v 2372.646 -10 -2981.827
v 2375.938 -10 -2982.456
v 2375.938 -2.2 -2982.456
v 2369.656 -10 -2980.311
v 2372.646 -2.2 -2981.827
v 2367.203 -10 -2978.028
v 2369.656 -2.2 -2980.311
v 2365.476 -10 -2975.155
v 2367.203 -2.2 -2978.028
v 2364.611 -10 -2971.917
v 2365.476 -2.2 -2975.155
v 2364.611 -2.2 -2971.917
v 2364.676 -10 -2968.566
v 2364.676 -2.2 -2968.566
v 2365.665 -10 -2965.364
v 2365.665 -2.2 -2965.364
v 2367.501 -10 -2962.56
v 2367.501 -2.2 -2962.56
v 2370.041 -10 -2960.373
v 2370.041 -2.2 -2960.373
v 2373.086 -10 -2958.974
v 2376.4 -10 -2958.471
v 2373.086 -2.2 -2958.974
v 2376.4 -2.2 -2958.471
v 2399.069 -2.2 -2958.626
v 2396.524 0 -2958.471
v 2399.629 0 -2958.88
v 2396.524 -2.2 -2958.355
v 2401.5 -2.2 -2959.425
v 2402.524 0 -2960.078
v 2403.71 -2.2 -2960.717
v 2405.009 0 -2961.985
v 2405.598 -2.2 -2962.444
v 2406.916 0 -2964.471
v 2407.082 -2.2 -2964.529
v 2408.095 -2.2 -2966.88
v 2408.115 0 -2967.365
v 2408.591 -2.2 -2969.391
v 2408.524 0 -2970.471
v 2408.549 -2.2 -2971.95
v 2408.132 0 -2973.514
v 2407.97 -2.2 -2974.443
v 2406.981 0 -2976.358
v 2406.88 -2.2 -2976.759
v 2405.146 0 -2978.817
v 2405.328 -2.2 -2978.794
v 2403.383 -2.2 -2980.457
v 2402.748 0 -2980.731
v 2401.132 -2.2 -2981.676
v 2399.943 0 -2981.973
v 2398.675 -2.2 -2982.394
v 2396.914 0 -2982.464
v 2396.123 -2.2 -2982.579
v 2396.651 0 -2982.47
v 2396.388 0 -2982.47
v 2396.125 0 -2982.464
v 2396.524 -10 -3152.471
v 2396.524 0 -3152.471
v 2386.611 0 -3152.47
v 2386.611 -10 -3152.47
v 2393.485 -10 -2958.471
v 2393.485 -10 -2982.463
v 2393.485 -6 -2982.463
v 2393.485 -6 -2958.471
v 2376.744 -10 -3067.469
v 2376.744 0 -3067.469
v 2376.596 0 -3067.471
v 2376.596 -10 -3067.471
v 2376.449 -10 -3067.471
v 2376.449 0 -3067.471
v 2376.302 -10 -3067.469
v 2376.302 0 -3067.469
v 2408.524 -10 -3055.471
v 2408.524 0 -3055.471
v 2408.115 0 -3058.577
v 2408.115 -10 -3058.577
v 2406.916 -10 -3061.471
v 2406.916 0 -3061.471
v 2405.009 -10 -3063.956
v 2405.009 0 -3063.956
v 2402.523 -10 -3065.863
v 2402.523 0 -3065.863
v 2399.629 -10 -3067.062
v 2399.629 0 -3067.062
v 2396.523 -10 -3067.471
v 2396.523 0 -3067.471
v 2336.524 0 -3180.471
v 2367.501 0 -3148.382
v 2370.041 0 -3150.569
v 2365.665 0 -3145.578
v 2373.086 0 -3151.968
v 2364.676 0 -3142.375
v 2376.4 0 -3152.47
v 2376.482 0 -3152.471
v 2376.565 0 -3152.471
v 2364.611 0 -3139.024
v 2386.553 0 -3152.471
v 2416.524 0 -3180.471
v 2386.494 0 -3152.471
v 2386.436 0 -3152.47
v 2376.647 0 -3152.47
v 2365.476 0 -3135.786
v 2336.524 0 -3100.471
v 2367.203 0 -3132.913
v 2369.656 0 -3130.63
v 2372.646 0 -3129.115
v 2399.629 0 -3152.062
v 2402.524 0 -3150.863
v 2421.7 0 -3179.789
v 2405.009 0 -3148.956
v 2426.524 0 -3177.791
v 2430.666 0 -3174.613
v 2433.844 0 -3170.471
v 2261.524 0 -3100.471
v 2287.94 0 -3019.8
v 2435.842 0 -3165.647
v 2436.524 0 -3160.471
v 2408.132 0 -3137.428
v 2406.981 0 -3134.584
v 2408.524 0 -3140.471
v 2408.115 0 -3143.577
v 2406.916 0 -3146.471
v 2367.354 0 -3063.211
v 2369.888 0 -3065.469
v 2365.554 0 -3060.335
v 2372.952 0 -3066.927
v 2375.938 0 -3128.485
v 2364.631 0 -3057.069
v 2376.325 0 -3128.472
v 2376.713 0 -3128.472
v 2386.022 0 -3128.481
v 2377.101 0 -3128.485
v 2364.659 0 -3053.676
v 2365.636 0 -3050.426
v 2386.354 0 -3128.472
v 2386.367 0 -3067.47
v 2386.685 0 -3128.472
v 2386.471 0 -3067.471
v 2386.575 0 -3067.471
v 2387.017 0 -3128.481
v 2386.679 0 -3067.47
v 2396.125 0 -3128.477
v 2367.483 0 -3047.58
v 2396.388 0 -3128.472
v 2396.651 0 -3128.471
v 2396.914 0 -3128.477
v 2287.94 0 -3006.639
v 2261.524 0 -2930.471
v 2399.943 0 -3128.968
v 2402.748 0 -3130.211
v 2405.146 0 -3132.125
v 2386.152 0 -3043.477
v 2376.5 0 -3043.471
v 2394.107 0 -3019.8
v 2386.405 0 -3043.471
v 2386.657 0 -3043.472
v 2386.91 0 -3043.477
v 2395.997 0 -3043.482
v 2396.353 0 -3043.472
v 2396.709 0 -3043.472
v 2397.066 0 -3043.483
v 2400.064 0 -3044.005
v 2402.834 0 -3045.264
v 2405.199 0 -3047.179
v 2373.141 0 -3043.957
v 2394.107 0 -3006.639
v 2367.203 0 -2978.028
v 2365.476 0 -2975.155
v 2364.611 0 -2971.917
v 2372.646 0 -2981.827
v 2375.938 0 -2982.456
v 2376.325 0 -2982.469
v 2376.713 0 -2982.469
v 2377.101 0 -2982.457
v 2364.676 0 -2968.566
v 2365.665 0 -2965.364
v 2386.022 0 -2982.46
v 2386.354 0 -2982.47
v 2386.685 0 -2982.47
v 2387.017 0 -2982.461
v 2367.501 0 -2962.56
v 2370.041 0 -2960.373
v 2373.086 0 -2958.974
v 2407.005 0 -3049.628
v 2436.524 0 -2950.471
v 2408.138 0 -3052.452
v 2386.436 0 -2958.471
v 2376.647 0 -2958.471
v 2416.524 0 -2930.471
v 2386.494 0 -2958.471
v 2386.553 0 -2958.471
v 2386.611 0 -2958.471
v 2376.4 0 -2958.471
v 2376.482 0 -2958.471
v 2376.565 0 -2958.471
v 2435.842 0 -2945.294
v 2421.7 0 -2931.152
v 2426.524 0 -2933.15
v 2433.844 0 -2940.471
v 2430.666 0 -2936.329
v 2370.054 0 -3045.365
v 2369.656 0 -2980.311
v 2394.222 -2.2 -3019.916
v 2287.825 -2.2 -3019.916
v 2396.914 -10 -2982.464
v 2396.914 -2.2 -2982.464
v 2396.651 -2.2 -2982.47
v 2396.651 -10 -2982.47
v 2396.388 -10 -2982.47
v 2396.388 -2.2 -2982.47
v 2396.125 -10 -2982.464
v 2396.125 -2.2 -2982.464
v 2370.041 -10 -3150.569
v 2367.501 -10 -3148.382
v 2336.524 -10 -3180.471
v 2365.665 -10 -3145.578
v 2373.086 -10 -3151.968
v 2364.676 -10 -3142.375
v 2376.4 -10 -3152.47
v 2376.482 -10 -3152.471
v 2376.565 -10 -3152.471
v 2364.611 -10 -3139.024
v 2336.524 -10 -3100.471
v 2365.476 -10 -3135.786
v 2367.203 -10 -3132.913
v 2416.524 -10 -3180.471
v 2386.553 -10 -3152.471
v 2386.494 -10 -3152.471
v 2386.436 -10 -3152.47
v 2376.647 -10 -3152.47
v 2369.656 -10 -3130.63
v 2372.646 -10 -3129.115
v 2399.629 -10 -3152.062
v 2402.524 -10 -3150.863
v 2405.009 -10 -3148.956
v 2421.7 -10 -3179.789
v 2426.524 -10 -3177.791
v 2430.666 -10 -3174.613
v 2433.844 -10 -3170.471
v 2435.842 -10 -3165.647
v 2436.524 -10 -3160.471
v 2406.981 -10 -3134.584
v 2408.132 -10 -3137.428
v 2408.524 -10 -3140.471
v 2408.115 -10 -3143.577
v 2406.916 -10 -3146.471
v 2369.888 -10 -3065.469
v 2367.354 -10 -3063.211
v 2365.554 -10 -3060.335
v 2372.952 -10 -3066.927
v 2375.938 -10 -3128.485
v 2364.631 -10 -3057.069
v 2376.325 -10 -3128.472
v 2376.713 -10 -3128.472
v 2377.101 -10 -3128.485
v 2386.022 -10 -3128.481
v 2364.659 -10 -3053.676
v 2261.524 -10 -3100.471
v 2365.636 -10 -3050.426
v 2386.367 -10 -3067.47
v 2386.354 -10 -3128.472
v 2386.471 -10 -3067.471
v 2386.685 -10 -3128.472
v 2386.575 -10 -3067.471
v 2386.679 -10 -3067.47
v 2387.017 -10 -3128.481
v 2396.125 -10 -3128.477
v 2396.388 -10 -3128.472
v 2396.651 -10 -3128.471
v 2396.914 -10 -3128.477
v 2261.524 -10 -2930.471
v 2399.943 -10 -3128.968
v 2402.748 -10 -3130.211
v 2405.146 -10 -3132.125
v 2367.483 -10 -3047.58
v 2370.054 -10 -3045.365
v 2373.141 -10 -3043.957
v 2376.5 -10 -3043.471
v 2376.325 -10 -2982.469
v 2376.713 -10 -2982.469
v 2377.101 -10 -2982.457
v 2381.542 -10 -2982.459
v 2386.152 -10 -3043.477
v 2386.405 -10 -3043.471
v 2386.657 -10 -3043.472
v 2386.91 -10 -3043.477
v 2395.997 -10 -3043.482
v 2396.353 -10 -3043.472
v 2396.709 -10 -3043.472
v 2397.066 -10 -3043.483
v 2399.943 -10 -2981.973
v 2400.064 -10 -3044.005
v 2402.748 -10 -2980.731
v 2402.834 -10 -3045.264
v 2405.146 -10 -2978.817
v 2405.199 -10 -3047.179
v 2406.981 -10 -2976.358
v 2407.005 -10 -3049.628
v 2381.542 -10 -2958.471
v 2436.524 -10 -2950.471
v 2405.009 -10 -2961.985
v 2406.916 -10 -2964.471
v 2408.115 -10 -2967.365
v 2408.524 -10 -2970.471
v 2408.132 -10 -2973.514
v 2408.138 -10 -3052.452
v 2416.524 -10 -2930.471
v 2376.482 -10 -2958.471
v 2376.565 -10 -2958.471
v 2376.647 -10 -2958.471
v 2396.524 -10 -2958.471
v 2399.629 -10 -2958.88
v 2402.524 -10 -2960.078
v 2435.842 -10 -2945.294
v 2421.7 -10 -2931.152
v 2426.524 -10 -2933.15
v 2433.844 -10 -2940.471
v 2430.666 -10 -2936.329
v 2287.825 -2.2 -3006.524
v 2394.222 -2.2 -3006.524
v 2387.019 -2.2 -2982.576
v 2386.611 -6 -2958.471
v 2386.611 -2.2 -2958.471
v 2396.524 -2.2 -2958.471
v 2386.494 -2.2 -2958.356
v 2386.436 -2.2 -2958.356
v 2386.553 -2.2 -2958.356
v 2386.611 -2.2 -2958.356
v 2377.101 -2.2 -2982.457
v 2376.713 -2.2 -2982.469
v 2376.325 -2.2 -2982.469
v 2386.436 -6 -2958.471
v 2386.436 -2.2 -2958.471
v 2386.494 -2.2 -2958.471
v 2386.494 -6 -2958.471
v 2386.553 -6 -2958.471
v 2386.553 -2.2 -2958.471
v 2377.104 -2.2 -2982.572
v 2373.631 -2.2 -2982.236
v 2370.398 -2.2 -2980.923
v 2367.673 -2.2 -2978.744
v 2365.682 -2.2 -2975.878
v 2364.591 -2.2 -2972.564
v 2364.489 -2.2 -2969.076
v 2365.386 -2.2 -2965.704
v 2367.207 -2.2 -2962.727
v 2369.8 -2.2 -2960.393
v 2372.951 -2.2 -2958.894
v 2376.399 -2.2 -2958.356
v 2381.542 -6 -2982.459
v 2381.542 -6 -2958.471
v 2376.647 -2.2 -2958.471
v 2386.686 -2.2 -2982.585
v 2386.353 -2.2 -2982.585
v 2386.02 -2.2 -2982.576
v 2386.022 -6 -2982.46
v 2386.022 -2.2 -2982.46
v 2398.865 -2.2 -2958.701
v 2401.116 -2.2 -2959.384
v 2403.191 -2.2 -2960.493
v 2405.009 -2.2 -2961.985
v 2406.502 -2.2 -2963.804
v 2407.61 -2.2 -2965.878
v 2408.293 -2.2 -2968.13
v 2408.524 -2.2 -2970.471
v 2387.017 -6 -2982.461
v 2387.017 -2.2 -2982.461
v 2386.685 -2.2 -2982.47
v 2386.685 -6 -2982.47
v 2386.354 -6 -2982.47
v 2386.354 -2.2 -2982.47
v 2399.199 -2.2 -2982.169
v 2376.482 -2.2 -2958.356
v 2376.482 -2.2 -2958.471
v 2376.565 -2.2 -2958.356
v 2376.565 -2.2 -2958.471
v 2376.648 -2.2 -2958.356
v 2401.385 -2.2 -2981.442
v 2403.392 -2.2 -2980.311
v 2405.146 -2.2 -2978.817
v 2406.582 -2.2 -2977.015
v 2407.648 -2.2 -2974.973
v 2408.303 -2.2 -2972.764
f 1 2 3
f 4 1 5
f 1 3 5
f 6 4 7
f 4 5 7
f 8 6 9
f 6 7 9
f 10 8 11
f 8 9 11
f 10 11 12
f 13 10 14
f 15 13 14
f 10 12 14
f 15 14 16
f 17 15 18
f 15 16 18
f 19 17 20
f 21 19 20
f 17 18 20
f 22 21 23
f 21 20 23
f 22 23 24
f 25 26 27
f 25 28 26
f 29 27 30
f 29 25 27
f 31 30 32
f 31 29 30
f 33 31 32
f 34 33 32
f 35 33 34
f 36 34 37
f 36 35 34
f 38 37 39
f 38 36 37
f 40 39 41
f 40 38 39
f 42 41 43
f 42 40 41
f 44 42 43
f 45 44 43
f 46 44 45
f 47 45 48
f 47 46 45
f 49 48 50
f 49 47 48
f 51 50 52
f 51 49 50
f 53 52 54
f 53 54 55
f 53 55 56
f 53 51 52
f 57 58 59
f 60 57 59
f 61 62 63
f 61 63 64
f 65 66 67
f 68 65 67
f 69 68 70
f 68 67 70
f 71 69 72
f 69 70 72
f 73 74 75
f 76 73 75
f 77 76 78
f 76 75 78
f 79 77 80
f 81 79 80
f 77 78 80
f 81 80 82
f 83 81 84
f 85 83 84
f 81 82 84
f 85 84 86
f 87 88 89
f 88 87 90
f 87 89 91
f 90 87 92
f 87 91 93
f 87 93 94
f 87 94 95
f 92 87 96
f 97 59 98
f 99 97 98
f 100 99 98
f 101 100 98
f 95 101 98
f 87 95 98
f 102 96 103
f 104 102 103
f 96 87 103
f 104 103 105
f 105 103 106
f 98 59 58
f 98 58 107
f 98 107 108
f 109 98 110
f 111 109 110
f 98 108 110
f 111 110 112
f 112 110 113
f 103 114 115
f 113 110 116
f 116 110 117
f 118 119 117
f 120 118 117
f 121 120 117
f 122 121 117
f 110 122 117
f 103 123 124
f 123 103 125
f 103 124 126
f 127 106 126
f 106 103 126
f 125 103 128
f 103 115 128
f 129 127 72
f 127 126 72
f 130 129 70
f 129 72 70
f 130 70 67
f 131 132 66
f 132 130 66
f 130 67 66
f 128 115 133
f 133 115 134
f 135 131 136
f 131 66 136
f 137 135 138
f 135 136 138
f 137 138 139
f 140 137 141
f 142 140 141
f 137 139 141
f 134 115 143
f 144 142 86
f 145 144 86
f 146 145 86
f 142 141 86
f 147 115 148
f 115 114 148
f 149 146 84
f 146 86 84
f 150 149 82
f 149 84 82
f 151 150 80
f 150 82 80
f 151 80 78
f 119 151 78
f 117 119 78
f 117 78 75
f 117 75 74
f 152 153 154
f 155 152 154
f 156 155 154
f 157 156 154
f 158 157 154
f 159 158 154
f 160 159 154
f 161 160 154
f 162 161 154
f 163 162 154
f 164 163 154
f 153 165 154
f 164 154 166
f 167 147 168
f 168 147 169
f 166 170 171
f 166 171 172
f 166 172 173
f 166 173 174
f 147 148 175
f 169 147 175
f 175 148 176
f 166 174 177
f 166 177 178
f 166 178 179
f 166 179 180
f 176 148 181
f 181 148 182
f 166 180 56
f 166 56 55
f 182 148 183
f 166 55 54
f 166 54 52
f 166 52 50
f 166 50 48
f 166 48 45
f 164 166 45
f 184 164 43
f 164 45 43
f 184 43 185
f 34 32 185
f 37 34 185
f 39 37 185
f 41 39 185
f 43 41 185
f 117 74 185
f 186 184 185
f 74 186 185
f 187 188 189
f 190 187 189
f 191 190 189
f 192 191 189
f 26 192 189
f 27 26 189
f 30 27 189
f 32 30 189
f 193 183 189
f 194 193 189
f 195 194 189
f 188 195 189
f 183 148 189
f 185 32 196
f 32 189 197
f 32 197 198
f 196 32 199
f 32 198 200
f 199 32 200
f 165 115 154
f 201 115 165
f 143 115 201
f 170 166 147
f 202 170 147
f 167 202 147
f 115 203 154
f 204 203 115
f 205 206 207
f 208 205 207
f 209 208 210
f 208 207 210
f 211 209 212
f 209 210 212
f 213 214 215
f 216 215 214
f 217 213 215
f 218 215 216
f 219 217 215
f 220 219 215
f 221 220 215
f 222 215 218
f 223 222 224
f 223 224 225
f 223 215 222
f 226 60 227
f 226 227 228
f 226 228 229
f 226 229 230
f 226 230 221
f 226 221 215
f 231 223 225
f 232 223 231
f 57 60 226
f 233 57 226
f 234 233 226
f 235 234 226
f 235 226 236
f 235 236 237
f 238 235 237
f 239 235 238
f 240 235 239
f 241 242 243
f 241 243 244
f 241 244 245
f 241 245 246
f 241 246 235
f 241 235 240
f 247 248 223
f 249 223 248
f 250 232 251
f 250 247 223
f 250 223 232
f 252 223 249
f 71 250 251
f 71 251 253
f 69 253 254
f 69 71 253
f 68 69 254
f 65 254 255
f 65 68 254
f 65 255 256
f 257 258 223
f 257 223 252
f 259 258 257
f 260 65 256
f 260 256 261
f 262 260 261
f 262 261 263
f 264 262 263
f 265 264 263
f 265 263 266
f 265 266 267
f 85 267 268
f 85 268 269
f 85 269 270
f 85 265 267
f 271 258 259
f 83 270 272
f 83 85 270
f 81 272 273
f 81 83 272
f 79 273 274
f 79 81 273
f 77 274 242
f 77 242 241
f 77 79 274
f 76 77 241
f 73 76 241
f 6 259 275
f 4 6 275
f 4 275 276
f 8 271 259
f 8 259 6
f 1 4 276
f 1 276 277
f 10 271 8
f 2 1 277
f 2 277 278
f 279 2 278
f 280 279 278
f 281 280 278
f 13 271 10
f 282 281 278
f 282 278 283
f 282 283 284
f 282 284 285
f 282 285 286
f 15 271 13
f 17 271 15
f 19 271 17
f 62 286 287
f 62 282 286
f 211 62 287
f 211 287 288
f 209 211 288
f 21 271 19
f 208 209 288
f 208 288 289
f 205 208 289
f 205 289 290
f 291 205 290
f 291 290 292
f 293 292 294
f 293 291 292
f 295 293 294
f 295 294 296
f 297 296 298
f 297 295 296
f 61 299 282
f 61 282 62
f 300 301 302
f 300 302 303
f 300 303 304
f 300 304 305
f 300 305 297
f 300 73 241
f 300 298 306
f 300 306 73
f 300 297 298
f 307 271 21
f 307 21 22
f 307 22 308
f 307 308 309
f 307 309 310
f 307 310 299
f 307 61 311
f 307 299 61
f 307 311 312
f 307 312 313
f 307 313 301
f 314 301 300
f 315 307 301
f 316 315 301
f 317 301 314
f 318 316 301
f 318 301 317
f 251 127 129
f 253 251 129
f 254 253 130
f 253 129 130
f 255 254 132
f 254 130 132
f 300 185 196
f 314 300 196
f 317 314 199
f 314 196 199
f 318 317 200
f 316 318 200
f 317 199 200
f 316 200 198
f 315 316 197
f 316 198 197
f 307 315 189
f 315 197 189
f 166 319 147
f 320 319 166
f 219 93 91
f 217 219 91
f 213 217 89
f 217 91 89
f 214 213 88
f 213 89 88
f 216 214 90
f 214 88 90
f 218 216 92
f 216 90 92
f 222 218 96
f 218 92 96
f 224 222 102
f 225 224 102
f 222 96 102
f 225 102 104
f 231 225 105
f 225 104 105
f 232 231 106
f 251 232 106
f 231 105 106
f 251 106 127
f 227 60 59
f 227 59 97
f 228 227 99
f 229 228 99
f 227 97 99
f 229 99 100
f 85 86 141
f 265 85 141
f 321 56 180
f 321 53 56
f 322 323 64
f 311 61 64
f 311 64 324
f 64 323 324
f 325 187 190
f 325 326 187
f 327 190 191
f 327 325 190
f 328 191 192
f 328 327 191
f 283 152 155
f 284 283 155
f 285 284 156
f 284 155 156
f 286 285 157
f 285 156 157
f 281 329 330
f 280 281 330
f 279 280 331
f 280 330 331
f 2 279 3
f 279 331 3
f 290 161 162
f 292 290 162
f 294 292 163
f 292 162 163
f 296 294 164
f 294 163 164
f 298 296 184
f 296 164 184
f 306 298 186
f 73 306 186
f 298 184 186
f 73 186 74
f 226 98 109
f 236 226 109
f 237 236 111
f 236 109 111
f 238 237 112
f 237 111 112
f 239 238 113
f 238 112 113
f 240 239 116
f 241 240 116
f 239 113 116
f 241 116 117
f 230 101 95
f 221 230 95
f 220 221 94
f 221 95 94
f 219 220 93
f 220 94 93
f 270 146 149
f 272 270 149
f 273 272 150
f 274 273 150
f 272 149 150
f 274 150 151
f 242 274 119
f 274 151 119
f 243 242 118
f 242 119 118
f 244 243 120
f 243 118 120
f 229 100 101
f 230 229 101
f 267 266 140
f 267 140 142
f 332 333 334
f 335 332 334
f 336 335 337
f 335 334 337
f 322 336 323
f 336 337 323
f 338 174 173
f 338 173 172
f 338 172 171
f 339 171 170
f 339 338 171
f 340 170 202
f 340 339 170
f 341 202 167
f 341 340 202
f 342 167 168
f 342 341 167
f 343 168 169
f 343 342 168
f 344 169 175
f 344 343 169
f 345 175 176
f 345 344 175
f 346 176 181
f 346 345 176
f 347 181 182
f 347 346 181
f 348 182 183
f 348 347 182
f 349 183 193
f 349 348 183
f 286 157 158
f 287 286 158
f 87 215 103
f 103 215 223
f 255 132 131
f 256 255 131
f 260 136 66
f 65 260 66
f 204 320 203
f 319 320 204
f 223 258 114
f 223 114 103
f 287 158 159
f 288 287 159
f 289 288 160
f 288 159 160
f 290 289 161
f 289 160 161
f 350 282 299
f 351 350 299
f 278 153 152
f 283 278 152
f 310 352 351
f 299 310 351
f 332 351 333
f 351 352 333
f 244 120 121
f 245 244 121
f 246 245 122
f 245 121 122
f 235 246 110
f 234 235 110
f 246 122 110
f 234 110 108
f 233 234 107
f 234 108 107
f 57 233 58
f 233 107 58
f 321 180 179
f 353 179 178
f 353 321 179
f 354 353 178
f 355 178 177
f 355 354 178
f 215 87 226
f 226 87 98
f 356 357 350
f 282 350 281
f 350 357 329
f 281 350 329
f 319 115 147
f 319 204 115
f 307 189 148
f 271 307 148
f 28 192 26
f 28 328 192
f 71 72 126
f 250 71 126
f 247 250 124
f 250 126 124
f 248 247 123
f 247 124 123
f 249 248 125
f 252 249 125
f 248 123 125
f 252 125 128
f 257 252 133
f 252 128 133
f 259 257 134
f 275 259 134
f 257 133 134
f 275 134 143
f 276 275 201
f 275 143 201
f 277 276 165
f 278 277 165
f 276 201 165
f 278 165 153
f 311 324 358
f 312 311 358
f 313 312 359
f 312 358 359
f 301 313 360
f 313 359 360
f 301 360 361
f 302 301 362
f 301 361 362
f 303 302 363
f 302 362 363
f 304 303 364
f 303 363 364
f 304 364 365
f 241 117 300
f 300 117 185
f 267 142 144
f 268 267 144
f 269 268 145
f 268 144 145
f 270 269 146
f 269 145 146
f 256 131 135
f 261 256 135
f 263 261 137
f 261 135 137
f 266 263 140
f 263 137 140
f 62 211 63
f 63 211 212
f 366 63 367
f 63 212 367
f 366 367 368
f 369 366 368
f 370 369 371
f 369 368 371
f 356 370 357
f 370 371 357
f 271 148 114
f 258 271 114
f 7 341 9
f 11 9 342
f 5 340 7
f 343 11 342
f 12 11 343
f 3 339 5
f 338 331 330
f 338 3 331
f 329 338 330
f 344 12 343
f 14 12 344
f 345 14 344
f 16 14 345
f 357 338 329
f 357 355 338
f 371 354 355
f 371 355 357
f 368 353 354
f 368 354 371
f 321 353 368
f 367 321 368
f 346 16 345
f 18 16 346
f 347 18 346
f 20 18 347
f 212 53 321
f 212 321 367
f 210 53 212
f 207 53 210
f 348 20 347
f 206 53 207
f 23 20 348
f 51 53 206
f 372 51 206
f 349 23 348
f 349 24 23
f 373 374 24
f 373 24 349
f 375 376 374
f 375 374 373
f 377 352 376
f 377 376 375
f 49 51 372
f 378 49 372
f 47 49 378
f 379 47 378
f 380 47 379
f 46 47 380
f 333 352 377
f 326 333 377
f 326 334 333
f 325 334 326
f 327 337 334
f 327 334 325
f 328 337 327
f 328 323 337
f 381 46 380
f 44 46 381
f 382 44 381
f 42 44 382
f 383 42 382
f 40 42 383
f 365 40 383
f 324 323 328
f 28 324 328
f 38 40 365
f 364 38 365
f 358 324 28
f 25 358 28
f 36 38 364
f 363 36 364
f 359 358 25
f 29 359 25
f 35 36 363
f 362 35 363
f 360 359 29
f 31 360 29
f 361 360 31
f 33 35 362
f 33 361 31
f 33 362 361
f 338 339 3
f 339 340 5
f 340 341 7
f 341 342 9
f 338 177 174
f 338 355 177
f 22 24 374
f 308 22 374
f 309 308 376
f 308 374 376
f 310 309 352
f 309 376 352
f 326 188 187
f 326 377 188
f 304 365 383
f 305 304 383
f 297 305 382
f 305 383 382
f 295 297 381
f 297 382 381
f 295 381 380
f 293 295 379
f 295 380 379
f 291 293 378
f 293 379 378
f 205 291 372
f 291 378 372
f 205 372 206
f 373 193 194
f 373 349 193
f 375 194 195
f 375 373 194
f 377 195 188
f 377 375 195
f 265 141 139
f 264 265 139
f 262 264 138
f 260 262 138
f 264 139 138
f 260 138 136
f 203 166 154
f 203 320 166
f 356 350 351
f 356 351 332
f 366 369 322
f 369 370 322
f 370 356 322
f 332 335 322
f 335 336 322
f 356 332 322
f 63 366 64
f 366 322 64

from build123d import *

# Parameters (mm, degrees)
F1_DEPTH = 10
F2_W     = 75
F2_H     = 80
F3_DEPTH = 25
F4_W     = 11.9431421733
F4_H     = 45.6254482269
F5_DEPTH = 4
F6_W     = 106.1663627625
F6_H     = 13.160943985
F7_DEPTH = 2.2
F7_TAPER = -3


with BuildPart() as f1:
    # F0 (on Front) → F1 (new body)
    with BuildSketch(Plane.XZ):
        with BuildLine():
            Line((2416.5239715576, -2930.4707694799), (2261.5239715576, -2930.4707694799))
            Line((2261.5239715576, -2930.4707694799), (2261.5239715576, -3180.4707694799))
            Line((2261.5239715576, -3180.4707694799), (2416.5239715576, -3180.4707694799))
            ThreePointArc((2416.5239715576, -3180.4707694799), (2430.6661071813, -3174.6129051036), (2436.5239715576, -3160.4707694799))
            Line((2436.5239715576, -3160.4707694799), (2436.5239715576, -2950.4707694799))
            ThreePointArc((2436.5239715576, -2950.4707694799), (2430.6661071813, -2936.3286338561), (2416.5239715576, -2930.4707694799))
        make_face()
        with BuildLine():
            ThreePointArc((2386.0222752693, -3128.4812615319), (2386.5194053701, -3128.4707703486), (2387.0165433111, -3128.4808831974))
            Line((2387.0165433111, -3128.4808831974), (2396.1245883641, -3128.4774174437))
            ThreePointArc((2396.1245883641, -3128.4774174437), (2396.5194053701, -3128.4707703486), (2396.9142273205, -3128.4771169737))
            ThreePointArc((2396.9142273205, -3128.4771169737), (2405.1461252664, -3132.1246047665), (2408.5239715576, -3140.4707694799))
            ThreePointArc((2408.5239715576, -3140.4707694799), (2405.0091179195, -3148.9561858643), (2396.5235896881, -3152.4707694738))
            Line((2396.5235896881, -3152.4707694738), (2386.6109812809, -3152.4704540302))
            ThreePointArc((2386.6109812809, -3152.4704540302), (2386.5235896881, -3152.4707694738), (2386.4361981155, -3152.4704484682))
            Line((2386.4361981155, -3152.4704484682), (2376.6471792504, -3152.4701369576))
            ThreePointArc((2376.6471792504, -3152.4701369576), (2376.5235896881, -3152.4707694738), (2376.4000001663, -3152.4701290917))
            ThreePointArc((2376.4000001663, -3152.4701290917), (2364.5261998632, -3140.7020147361), (2375.9377122847, -3128.485098866))
            ThreePointArc((2375.9377122847, -3128.485098866), (2376.5194053701, -3128.4707703486), (2377.1011091915, -3128.4846561752))
            Line((2377.1011091915, -3128.4846561752), (2386.0222752693, -3128.4812615319))
        make_face(mode=Mode.SUBTRACT)
        with BuildLine():
            ThreePointArc((2386.1524570887, -3043.476521817), (2386.5310921212, -3043.4707715925), (2386.9097200631, -3043.476971162))
            Line((2386.9097200631, -3043.476971162), (2395.9966068909, -3043.4823631426))
            ThreePointArc((2395.9966068909, -3043.4823631426), (2396.5310921212, -3043.4707715925), (2397.0655632188, -3043.4829974403))
            ThreePointArc((2397.0655632188, -3043.4829974403), (2405.1986214046, -3047.179180366), (2408.5239715576, -3055.4707694799))
            ThreePointArc((2408.5239715576, -3055.4707694799), (2405.0088213897, -3063.9564823743), (2396.5227510032, -3067.4707694178))
            Line((2396.5227510032, -3067.4707694178), (2386.678988276, -3067.4697681805))
            ThreePointArc((2386.678988276, -3067.4697681805), (2386.5227510032, -3067.4707694178), (2386.3665139374, -3067.4697363978))
            Line((2386.3665139374, -3067.4697363978), (2376.7436992517, -3067.4687576337))
            ThreePointArc((2376.7436992517, -3067.4687576337), (2376.5227510032, -3067.4707694178), (2376.3018031686, -3067.4687126872))
            ThreePointArc((2376.3018031686, -3067.4687126872), (2364.5243795036, -3055.3718223336), (2376.4996870262, -3043.4707940523))
            Line((2376.4996870262, -3043.4707940523), (2386.1524570887, -3043.476521817))
        make_face(mode=Mode.SUBTRACT)
        with BuildLine():
            ThreePointArc((2386.4361981157, -2958.4710904915), (2386.5235896881, -2958.4707694859), (2386.6109812808, -2958.4710849295))
            Line((2386.6109812808, -2958.4710849295), (2396.5235896881, -2958.4707694859))
            ThreePointArc((2396.5235896881, -2958.4707694859), (2405.0091179195, -2961.9853530954), (2408.5239715576, -2970.4707694799))
            ThreePointArc((2408.5239715576, -2970.4707694799), (2405.1461252664, -2978.8169341932), (2396.9142273205, -2982.4644219861))
            ThreePointArc((2396.9142273205, -2982.4644219861), (2396.5194053701, -2982.4707686111), (2396.1245883641, -2982.4641215161))
            Line((2396.1245883641, -2982.4641215161), (2387.0165433111, -2982.4606557624))
            ThreePointArc((2387.0165433111, -2982.4606557624), (2386.5194053701, -2982.4707686111), (2386.0222752693, -2982.4602774278))
            Line((2386.0222752693, -2982.4602774278), (2377.1011091916, -2982.4568827845))
            ThreePointArc((2377.1011091916, -2982.4568827845), (2376.5194053701, -2982.4707686111), (2375.9377122847, -2982.4564400938))
            ThreePointArc((2375.9377122847, -2982.4564400938), (2364.5261998632, -2970.2395242236), (2376.4000001663, -2958.471409868))
            ThreePointArc((2376.4000001663, -2958.471409868), (2376.523589688, -2958.4707694859), (2376.6471792503, -2958.4714020022))
            Line((2376.6471792503, -2958.4714020022), (2386.4361981157, -2958.4710904915))
        make_face(mode=Mode.SUBTRACT)
    extrude(amount=F1_DEPTH)

    # F2 (on face) → F3 (cut)
    with BuildSketch(Plane.XZ.offset(10)):
        with Locations((2299.0239715576, -3140.4707694799)):
            Rectangle(F2_W, F2_H)
    extrude(amount=-F3_DEPTH, mode=Mode.SUBTRACT)

    # F4 (on face) → F5 (join)
    with BuildSketch(Plane.XZ.offset(10)):
        with Locations((2387.5132597697, -2971.1128473282)):
            Rectangle(F4_W, F4_H)
    extrude(amount=-F5_DEPTH)

    # F6 (on face) → F7 (cut)
    with BuildSketch(Plane(origin=(0, 0, 0), x_dir=(-1, 0, 0), z_dir=(0, 1, 0))):
        with Locations((-2341.0234451294, -3013.2199525833)):
            Rectangle(F6_W, F6_H)
        with BuildLine():
            ThreePointArc((-2386.4361981157, -2958.4710904915), (-2386.5235896881, -2958.4707694859), (-2386.6109812808, -2958.4710849295))
            Line((-2386.6109812808, -2958.4710849295), (-2396.5235896881, -2958.4707694859))
            ThreePointArc((-2396.5235896881, -2958.4707694859), (-2408.5223126278, -2970.6702978312), (-2396.1245883641, -2982.4641215161))
            Line((-2396.1245883641, -2982.4641215161), (-2387.0165433111, -2982.4606557624))
            ThreePointArc((-2387.0165433111, -2982.4606557624), (-2386.5194053701, -2982.4707686111), (-2386.0222752693, -2982.4602774278))
            Line((-2386.0222752693, -2982.4602774278), (-2377.1011091916, -2982.4568827845))
            ThreePointArc((-2377.1011091916, -2982.4568827845), (-2364.5290948318, -2970.8213865538), (-2376.4000001663, -2958.4714098681))
            ThreePointArc((-2376.4000001663, -2958.471409868), (-2376.523589688, -2958.4707694859), (-2376.6471792503, -2958.4714020022))
            Line((-2376.6471792503, -2958.4714020022), (-2386.4361981157, -2958.4710904915))
        make_face()
    extrude(amount=-F7_DEPTH, taper=F7_TAPER, mode=Mode.SUBTRACT)


solid = f1.part
